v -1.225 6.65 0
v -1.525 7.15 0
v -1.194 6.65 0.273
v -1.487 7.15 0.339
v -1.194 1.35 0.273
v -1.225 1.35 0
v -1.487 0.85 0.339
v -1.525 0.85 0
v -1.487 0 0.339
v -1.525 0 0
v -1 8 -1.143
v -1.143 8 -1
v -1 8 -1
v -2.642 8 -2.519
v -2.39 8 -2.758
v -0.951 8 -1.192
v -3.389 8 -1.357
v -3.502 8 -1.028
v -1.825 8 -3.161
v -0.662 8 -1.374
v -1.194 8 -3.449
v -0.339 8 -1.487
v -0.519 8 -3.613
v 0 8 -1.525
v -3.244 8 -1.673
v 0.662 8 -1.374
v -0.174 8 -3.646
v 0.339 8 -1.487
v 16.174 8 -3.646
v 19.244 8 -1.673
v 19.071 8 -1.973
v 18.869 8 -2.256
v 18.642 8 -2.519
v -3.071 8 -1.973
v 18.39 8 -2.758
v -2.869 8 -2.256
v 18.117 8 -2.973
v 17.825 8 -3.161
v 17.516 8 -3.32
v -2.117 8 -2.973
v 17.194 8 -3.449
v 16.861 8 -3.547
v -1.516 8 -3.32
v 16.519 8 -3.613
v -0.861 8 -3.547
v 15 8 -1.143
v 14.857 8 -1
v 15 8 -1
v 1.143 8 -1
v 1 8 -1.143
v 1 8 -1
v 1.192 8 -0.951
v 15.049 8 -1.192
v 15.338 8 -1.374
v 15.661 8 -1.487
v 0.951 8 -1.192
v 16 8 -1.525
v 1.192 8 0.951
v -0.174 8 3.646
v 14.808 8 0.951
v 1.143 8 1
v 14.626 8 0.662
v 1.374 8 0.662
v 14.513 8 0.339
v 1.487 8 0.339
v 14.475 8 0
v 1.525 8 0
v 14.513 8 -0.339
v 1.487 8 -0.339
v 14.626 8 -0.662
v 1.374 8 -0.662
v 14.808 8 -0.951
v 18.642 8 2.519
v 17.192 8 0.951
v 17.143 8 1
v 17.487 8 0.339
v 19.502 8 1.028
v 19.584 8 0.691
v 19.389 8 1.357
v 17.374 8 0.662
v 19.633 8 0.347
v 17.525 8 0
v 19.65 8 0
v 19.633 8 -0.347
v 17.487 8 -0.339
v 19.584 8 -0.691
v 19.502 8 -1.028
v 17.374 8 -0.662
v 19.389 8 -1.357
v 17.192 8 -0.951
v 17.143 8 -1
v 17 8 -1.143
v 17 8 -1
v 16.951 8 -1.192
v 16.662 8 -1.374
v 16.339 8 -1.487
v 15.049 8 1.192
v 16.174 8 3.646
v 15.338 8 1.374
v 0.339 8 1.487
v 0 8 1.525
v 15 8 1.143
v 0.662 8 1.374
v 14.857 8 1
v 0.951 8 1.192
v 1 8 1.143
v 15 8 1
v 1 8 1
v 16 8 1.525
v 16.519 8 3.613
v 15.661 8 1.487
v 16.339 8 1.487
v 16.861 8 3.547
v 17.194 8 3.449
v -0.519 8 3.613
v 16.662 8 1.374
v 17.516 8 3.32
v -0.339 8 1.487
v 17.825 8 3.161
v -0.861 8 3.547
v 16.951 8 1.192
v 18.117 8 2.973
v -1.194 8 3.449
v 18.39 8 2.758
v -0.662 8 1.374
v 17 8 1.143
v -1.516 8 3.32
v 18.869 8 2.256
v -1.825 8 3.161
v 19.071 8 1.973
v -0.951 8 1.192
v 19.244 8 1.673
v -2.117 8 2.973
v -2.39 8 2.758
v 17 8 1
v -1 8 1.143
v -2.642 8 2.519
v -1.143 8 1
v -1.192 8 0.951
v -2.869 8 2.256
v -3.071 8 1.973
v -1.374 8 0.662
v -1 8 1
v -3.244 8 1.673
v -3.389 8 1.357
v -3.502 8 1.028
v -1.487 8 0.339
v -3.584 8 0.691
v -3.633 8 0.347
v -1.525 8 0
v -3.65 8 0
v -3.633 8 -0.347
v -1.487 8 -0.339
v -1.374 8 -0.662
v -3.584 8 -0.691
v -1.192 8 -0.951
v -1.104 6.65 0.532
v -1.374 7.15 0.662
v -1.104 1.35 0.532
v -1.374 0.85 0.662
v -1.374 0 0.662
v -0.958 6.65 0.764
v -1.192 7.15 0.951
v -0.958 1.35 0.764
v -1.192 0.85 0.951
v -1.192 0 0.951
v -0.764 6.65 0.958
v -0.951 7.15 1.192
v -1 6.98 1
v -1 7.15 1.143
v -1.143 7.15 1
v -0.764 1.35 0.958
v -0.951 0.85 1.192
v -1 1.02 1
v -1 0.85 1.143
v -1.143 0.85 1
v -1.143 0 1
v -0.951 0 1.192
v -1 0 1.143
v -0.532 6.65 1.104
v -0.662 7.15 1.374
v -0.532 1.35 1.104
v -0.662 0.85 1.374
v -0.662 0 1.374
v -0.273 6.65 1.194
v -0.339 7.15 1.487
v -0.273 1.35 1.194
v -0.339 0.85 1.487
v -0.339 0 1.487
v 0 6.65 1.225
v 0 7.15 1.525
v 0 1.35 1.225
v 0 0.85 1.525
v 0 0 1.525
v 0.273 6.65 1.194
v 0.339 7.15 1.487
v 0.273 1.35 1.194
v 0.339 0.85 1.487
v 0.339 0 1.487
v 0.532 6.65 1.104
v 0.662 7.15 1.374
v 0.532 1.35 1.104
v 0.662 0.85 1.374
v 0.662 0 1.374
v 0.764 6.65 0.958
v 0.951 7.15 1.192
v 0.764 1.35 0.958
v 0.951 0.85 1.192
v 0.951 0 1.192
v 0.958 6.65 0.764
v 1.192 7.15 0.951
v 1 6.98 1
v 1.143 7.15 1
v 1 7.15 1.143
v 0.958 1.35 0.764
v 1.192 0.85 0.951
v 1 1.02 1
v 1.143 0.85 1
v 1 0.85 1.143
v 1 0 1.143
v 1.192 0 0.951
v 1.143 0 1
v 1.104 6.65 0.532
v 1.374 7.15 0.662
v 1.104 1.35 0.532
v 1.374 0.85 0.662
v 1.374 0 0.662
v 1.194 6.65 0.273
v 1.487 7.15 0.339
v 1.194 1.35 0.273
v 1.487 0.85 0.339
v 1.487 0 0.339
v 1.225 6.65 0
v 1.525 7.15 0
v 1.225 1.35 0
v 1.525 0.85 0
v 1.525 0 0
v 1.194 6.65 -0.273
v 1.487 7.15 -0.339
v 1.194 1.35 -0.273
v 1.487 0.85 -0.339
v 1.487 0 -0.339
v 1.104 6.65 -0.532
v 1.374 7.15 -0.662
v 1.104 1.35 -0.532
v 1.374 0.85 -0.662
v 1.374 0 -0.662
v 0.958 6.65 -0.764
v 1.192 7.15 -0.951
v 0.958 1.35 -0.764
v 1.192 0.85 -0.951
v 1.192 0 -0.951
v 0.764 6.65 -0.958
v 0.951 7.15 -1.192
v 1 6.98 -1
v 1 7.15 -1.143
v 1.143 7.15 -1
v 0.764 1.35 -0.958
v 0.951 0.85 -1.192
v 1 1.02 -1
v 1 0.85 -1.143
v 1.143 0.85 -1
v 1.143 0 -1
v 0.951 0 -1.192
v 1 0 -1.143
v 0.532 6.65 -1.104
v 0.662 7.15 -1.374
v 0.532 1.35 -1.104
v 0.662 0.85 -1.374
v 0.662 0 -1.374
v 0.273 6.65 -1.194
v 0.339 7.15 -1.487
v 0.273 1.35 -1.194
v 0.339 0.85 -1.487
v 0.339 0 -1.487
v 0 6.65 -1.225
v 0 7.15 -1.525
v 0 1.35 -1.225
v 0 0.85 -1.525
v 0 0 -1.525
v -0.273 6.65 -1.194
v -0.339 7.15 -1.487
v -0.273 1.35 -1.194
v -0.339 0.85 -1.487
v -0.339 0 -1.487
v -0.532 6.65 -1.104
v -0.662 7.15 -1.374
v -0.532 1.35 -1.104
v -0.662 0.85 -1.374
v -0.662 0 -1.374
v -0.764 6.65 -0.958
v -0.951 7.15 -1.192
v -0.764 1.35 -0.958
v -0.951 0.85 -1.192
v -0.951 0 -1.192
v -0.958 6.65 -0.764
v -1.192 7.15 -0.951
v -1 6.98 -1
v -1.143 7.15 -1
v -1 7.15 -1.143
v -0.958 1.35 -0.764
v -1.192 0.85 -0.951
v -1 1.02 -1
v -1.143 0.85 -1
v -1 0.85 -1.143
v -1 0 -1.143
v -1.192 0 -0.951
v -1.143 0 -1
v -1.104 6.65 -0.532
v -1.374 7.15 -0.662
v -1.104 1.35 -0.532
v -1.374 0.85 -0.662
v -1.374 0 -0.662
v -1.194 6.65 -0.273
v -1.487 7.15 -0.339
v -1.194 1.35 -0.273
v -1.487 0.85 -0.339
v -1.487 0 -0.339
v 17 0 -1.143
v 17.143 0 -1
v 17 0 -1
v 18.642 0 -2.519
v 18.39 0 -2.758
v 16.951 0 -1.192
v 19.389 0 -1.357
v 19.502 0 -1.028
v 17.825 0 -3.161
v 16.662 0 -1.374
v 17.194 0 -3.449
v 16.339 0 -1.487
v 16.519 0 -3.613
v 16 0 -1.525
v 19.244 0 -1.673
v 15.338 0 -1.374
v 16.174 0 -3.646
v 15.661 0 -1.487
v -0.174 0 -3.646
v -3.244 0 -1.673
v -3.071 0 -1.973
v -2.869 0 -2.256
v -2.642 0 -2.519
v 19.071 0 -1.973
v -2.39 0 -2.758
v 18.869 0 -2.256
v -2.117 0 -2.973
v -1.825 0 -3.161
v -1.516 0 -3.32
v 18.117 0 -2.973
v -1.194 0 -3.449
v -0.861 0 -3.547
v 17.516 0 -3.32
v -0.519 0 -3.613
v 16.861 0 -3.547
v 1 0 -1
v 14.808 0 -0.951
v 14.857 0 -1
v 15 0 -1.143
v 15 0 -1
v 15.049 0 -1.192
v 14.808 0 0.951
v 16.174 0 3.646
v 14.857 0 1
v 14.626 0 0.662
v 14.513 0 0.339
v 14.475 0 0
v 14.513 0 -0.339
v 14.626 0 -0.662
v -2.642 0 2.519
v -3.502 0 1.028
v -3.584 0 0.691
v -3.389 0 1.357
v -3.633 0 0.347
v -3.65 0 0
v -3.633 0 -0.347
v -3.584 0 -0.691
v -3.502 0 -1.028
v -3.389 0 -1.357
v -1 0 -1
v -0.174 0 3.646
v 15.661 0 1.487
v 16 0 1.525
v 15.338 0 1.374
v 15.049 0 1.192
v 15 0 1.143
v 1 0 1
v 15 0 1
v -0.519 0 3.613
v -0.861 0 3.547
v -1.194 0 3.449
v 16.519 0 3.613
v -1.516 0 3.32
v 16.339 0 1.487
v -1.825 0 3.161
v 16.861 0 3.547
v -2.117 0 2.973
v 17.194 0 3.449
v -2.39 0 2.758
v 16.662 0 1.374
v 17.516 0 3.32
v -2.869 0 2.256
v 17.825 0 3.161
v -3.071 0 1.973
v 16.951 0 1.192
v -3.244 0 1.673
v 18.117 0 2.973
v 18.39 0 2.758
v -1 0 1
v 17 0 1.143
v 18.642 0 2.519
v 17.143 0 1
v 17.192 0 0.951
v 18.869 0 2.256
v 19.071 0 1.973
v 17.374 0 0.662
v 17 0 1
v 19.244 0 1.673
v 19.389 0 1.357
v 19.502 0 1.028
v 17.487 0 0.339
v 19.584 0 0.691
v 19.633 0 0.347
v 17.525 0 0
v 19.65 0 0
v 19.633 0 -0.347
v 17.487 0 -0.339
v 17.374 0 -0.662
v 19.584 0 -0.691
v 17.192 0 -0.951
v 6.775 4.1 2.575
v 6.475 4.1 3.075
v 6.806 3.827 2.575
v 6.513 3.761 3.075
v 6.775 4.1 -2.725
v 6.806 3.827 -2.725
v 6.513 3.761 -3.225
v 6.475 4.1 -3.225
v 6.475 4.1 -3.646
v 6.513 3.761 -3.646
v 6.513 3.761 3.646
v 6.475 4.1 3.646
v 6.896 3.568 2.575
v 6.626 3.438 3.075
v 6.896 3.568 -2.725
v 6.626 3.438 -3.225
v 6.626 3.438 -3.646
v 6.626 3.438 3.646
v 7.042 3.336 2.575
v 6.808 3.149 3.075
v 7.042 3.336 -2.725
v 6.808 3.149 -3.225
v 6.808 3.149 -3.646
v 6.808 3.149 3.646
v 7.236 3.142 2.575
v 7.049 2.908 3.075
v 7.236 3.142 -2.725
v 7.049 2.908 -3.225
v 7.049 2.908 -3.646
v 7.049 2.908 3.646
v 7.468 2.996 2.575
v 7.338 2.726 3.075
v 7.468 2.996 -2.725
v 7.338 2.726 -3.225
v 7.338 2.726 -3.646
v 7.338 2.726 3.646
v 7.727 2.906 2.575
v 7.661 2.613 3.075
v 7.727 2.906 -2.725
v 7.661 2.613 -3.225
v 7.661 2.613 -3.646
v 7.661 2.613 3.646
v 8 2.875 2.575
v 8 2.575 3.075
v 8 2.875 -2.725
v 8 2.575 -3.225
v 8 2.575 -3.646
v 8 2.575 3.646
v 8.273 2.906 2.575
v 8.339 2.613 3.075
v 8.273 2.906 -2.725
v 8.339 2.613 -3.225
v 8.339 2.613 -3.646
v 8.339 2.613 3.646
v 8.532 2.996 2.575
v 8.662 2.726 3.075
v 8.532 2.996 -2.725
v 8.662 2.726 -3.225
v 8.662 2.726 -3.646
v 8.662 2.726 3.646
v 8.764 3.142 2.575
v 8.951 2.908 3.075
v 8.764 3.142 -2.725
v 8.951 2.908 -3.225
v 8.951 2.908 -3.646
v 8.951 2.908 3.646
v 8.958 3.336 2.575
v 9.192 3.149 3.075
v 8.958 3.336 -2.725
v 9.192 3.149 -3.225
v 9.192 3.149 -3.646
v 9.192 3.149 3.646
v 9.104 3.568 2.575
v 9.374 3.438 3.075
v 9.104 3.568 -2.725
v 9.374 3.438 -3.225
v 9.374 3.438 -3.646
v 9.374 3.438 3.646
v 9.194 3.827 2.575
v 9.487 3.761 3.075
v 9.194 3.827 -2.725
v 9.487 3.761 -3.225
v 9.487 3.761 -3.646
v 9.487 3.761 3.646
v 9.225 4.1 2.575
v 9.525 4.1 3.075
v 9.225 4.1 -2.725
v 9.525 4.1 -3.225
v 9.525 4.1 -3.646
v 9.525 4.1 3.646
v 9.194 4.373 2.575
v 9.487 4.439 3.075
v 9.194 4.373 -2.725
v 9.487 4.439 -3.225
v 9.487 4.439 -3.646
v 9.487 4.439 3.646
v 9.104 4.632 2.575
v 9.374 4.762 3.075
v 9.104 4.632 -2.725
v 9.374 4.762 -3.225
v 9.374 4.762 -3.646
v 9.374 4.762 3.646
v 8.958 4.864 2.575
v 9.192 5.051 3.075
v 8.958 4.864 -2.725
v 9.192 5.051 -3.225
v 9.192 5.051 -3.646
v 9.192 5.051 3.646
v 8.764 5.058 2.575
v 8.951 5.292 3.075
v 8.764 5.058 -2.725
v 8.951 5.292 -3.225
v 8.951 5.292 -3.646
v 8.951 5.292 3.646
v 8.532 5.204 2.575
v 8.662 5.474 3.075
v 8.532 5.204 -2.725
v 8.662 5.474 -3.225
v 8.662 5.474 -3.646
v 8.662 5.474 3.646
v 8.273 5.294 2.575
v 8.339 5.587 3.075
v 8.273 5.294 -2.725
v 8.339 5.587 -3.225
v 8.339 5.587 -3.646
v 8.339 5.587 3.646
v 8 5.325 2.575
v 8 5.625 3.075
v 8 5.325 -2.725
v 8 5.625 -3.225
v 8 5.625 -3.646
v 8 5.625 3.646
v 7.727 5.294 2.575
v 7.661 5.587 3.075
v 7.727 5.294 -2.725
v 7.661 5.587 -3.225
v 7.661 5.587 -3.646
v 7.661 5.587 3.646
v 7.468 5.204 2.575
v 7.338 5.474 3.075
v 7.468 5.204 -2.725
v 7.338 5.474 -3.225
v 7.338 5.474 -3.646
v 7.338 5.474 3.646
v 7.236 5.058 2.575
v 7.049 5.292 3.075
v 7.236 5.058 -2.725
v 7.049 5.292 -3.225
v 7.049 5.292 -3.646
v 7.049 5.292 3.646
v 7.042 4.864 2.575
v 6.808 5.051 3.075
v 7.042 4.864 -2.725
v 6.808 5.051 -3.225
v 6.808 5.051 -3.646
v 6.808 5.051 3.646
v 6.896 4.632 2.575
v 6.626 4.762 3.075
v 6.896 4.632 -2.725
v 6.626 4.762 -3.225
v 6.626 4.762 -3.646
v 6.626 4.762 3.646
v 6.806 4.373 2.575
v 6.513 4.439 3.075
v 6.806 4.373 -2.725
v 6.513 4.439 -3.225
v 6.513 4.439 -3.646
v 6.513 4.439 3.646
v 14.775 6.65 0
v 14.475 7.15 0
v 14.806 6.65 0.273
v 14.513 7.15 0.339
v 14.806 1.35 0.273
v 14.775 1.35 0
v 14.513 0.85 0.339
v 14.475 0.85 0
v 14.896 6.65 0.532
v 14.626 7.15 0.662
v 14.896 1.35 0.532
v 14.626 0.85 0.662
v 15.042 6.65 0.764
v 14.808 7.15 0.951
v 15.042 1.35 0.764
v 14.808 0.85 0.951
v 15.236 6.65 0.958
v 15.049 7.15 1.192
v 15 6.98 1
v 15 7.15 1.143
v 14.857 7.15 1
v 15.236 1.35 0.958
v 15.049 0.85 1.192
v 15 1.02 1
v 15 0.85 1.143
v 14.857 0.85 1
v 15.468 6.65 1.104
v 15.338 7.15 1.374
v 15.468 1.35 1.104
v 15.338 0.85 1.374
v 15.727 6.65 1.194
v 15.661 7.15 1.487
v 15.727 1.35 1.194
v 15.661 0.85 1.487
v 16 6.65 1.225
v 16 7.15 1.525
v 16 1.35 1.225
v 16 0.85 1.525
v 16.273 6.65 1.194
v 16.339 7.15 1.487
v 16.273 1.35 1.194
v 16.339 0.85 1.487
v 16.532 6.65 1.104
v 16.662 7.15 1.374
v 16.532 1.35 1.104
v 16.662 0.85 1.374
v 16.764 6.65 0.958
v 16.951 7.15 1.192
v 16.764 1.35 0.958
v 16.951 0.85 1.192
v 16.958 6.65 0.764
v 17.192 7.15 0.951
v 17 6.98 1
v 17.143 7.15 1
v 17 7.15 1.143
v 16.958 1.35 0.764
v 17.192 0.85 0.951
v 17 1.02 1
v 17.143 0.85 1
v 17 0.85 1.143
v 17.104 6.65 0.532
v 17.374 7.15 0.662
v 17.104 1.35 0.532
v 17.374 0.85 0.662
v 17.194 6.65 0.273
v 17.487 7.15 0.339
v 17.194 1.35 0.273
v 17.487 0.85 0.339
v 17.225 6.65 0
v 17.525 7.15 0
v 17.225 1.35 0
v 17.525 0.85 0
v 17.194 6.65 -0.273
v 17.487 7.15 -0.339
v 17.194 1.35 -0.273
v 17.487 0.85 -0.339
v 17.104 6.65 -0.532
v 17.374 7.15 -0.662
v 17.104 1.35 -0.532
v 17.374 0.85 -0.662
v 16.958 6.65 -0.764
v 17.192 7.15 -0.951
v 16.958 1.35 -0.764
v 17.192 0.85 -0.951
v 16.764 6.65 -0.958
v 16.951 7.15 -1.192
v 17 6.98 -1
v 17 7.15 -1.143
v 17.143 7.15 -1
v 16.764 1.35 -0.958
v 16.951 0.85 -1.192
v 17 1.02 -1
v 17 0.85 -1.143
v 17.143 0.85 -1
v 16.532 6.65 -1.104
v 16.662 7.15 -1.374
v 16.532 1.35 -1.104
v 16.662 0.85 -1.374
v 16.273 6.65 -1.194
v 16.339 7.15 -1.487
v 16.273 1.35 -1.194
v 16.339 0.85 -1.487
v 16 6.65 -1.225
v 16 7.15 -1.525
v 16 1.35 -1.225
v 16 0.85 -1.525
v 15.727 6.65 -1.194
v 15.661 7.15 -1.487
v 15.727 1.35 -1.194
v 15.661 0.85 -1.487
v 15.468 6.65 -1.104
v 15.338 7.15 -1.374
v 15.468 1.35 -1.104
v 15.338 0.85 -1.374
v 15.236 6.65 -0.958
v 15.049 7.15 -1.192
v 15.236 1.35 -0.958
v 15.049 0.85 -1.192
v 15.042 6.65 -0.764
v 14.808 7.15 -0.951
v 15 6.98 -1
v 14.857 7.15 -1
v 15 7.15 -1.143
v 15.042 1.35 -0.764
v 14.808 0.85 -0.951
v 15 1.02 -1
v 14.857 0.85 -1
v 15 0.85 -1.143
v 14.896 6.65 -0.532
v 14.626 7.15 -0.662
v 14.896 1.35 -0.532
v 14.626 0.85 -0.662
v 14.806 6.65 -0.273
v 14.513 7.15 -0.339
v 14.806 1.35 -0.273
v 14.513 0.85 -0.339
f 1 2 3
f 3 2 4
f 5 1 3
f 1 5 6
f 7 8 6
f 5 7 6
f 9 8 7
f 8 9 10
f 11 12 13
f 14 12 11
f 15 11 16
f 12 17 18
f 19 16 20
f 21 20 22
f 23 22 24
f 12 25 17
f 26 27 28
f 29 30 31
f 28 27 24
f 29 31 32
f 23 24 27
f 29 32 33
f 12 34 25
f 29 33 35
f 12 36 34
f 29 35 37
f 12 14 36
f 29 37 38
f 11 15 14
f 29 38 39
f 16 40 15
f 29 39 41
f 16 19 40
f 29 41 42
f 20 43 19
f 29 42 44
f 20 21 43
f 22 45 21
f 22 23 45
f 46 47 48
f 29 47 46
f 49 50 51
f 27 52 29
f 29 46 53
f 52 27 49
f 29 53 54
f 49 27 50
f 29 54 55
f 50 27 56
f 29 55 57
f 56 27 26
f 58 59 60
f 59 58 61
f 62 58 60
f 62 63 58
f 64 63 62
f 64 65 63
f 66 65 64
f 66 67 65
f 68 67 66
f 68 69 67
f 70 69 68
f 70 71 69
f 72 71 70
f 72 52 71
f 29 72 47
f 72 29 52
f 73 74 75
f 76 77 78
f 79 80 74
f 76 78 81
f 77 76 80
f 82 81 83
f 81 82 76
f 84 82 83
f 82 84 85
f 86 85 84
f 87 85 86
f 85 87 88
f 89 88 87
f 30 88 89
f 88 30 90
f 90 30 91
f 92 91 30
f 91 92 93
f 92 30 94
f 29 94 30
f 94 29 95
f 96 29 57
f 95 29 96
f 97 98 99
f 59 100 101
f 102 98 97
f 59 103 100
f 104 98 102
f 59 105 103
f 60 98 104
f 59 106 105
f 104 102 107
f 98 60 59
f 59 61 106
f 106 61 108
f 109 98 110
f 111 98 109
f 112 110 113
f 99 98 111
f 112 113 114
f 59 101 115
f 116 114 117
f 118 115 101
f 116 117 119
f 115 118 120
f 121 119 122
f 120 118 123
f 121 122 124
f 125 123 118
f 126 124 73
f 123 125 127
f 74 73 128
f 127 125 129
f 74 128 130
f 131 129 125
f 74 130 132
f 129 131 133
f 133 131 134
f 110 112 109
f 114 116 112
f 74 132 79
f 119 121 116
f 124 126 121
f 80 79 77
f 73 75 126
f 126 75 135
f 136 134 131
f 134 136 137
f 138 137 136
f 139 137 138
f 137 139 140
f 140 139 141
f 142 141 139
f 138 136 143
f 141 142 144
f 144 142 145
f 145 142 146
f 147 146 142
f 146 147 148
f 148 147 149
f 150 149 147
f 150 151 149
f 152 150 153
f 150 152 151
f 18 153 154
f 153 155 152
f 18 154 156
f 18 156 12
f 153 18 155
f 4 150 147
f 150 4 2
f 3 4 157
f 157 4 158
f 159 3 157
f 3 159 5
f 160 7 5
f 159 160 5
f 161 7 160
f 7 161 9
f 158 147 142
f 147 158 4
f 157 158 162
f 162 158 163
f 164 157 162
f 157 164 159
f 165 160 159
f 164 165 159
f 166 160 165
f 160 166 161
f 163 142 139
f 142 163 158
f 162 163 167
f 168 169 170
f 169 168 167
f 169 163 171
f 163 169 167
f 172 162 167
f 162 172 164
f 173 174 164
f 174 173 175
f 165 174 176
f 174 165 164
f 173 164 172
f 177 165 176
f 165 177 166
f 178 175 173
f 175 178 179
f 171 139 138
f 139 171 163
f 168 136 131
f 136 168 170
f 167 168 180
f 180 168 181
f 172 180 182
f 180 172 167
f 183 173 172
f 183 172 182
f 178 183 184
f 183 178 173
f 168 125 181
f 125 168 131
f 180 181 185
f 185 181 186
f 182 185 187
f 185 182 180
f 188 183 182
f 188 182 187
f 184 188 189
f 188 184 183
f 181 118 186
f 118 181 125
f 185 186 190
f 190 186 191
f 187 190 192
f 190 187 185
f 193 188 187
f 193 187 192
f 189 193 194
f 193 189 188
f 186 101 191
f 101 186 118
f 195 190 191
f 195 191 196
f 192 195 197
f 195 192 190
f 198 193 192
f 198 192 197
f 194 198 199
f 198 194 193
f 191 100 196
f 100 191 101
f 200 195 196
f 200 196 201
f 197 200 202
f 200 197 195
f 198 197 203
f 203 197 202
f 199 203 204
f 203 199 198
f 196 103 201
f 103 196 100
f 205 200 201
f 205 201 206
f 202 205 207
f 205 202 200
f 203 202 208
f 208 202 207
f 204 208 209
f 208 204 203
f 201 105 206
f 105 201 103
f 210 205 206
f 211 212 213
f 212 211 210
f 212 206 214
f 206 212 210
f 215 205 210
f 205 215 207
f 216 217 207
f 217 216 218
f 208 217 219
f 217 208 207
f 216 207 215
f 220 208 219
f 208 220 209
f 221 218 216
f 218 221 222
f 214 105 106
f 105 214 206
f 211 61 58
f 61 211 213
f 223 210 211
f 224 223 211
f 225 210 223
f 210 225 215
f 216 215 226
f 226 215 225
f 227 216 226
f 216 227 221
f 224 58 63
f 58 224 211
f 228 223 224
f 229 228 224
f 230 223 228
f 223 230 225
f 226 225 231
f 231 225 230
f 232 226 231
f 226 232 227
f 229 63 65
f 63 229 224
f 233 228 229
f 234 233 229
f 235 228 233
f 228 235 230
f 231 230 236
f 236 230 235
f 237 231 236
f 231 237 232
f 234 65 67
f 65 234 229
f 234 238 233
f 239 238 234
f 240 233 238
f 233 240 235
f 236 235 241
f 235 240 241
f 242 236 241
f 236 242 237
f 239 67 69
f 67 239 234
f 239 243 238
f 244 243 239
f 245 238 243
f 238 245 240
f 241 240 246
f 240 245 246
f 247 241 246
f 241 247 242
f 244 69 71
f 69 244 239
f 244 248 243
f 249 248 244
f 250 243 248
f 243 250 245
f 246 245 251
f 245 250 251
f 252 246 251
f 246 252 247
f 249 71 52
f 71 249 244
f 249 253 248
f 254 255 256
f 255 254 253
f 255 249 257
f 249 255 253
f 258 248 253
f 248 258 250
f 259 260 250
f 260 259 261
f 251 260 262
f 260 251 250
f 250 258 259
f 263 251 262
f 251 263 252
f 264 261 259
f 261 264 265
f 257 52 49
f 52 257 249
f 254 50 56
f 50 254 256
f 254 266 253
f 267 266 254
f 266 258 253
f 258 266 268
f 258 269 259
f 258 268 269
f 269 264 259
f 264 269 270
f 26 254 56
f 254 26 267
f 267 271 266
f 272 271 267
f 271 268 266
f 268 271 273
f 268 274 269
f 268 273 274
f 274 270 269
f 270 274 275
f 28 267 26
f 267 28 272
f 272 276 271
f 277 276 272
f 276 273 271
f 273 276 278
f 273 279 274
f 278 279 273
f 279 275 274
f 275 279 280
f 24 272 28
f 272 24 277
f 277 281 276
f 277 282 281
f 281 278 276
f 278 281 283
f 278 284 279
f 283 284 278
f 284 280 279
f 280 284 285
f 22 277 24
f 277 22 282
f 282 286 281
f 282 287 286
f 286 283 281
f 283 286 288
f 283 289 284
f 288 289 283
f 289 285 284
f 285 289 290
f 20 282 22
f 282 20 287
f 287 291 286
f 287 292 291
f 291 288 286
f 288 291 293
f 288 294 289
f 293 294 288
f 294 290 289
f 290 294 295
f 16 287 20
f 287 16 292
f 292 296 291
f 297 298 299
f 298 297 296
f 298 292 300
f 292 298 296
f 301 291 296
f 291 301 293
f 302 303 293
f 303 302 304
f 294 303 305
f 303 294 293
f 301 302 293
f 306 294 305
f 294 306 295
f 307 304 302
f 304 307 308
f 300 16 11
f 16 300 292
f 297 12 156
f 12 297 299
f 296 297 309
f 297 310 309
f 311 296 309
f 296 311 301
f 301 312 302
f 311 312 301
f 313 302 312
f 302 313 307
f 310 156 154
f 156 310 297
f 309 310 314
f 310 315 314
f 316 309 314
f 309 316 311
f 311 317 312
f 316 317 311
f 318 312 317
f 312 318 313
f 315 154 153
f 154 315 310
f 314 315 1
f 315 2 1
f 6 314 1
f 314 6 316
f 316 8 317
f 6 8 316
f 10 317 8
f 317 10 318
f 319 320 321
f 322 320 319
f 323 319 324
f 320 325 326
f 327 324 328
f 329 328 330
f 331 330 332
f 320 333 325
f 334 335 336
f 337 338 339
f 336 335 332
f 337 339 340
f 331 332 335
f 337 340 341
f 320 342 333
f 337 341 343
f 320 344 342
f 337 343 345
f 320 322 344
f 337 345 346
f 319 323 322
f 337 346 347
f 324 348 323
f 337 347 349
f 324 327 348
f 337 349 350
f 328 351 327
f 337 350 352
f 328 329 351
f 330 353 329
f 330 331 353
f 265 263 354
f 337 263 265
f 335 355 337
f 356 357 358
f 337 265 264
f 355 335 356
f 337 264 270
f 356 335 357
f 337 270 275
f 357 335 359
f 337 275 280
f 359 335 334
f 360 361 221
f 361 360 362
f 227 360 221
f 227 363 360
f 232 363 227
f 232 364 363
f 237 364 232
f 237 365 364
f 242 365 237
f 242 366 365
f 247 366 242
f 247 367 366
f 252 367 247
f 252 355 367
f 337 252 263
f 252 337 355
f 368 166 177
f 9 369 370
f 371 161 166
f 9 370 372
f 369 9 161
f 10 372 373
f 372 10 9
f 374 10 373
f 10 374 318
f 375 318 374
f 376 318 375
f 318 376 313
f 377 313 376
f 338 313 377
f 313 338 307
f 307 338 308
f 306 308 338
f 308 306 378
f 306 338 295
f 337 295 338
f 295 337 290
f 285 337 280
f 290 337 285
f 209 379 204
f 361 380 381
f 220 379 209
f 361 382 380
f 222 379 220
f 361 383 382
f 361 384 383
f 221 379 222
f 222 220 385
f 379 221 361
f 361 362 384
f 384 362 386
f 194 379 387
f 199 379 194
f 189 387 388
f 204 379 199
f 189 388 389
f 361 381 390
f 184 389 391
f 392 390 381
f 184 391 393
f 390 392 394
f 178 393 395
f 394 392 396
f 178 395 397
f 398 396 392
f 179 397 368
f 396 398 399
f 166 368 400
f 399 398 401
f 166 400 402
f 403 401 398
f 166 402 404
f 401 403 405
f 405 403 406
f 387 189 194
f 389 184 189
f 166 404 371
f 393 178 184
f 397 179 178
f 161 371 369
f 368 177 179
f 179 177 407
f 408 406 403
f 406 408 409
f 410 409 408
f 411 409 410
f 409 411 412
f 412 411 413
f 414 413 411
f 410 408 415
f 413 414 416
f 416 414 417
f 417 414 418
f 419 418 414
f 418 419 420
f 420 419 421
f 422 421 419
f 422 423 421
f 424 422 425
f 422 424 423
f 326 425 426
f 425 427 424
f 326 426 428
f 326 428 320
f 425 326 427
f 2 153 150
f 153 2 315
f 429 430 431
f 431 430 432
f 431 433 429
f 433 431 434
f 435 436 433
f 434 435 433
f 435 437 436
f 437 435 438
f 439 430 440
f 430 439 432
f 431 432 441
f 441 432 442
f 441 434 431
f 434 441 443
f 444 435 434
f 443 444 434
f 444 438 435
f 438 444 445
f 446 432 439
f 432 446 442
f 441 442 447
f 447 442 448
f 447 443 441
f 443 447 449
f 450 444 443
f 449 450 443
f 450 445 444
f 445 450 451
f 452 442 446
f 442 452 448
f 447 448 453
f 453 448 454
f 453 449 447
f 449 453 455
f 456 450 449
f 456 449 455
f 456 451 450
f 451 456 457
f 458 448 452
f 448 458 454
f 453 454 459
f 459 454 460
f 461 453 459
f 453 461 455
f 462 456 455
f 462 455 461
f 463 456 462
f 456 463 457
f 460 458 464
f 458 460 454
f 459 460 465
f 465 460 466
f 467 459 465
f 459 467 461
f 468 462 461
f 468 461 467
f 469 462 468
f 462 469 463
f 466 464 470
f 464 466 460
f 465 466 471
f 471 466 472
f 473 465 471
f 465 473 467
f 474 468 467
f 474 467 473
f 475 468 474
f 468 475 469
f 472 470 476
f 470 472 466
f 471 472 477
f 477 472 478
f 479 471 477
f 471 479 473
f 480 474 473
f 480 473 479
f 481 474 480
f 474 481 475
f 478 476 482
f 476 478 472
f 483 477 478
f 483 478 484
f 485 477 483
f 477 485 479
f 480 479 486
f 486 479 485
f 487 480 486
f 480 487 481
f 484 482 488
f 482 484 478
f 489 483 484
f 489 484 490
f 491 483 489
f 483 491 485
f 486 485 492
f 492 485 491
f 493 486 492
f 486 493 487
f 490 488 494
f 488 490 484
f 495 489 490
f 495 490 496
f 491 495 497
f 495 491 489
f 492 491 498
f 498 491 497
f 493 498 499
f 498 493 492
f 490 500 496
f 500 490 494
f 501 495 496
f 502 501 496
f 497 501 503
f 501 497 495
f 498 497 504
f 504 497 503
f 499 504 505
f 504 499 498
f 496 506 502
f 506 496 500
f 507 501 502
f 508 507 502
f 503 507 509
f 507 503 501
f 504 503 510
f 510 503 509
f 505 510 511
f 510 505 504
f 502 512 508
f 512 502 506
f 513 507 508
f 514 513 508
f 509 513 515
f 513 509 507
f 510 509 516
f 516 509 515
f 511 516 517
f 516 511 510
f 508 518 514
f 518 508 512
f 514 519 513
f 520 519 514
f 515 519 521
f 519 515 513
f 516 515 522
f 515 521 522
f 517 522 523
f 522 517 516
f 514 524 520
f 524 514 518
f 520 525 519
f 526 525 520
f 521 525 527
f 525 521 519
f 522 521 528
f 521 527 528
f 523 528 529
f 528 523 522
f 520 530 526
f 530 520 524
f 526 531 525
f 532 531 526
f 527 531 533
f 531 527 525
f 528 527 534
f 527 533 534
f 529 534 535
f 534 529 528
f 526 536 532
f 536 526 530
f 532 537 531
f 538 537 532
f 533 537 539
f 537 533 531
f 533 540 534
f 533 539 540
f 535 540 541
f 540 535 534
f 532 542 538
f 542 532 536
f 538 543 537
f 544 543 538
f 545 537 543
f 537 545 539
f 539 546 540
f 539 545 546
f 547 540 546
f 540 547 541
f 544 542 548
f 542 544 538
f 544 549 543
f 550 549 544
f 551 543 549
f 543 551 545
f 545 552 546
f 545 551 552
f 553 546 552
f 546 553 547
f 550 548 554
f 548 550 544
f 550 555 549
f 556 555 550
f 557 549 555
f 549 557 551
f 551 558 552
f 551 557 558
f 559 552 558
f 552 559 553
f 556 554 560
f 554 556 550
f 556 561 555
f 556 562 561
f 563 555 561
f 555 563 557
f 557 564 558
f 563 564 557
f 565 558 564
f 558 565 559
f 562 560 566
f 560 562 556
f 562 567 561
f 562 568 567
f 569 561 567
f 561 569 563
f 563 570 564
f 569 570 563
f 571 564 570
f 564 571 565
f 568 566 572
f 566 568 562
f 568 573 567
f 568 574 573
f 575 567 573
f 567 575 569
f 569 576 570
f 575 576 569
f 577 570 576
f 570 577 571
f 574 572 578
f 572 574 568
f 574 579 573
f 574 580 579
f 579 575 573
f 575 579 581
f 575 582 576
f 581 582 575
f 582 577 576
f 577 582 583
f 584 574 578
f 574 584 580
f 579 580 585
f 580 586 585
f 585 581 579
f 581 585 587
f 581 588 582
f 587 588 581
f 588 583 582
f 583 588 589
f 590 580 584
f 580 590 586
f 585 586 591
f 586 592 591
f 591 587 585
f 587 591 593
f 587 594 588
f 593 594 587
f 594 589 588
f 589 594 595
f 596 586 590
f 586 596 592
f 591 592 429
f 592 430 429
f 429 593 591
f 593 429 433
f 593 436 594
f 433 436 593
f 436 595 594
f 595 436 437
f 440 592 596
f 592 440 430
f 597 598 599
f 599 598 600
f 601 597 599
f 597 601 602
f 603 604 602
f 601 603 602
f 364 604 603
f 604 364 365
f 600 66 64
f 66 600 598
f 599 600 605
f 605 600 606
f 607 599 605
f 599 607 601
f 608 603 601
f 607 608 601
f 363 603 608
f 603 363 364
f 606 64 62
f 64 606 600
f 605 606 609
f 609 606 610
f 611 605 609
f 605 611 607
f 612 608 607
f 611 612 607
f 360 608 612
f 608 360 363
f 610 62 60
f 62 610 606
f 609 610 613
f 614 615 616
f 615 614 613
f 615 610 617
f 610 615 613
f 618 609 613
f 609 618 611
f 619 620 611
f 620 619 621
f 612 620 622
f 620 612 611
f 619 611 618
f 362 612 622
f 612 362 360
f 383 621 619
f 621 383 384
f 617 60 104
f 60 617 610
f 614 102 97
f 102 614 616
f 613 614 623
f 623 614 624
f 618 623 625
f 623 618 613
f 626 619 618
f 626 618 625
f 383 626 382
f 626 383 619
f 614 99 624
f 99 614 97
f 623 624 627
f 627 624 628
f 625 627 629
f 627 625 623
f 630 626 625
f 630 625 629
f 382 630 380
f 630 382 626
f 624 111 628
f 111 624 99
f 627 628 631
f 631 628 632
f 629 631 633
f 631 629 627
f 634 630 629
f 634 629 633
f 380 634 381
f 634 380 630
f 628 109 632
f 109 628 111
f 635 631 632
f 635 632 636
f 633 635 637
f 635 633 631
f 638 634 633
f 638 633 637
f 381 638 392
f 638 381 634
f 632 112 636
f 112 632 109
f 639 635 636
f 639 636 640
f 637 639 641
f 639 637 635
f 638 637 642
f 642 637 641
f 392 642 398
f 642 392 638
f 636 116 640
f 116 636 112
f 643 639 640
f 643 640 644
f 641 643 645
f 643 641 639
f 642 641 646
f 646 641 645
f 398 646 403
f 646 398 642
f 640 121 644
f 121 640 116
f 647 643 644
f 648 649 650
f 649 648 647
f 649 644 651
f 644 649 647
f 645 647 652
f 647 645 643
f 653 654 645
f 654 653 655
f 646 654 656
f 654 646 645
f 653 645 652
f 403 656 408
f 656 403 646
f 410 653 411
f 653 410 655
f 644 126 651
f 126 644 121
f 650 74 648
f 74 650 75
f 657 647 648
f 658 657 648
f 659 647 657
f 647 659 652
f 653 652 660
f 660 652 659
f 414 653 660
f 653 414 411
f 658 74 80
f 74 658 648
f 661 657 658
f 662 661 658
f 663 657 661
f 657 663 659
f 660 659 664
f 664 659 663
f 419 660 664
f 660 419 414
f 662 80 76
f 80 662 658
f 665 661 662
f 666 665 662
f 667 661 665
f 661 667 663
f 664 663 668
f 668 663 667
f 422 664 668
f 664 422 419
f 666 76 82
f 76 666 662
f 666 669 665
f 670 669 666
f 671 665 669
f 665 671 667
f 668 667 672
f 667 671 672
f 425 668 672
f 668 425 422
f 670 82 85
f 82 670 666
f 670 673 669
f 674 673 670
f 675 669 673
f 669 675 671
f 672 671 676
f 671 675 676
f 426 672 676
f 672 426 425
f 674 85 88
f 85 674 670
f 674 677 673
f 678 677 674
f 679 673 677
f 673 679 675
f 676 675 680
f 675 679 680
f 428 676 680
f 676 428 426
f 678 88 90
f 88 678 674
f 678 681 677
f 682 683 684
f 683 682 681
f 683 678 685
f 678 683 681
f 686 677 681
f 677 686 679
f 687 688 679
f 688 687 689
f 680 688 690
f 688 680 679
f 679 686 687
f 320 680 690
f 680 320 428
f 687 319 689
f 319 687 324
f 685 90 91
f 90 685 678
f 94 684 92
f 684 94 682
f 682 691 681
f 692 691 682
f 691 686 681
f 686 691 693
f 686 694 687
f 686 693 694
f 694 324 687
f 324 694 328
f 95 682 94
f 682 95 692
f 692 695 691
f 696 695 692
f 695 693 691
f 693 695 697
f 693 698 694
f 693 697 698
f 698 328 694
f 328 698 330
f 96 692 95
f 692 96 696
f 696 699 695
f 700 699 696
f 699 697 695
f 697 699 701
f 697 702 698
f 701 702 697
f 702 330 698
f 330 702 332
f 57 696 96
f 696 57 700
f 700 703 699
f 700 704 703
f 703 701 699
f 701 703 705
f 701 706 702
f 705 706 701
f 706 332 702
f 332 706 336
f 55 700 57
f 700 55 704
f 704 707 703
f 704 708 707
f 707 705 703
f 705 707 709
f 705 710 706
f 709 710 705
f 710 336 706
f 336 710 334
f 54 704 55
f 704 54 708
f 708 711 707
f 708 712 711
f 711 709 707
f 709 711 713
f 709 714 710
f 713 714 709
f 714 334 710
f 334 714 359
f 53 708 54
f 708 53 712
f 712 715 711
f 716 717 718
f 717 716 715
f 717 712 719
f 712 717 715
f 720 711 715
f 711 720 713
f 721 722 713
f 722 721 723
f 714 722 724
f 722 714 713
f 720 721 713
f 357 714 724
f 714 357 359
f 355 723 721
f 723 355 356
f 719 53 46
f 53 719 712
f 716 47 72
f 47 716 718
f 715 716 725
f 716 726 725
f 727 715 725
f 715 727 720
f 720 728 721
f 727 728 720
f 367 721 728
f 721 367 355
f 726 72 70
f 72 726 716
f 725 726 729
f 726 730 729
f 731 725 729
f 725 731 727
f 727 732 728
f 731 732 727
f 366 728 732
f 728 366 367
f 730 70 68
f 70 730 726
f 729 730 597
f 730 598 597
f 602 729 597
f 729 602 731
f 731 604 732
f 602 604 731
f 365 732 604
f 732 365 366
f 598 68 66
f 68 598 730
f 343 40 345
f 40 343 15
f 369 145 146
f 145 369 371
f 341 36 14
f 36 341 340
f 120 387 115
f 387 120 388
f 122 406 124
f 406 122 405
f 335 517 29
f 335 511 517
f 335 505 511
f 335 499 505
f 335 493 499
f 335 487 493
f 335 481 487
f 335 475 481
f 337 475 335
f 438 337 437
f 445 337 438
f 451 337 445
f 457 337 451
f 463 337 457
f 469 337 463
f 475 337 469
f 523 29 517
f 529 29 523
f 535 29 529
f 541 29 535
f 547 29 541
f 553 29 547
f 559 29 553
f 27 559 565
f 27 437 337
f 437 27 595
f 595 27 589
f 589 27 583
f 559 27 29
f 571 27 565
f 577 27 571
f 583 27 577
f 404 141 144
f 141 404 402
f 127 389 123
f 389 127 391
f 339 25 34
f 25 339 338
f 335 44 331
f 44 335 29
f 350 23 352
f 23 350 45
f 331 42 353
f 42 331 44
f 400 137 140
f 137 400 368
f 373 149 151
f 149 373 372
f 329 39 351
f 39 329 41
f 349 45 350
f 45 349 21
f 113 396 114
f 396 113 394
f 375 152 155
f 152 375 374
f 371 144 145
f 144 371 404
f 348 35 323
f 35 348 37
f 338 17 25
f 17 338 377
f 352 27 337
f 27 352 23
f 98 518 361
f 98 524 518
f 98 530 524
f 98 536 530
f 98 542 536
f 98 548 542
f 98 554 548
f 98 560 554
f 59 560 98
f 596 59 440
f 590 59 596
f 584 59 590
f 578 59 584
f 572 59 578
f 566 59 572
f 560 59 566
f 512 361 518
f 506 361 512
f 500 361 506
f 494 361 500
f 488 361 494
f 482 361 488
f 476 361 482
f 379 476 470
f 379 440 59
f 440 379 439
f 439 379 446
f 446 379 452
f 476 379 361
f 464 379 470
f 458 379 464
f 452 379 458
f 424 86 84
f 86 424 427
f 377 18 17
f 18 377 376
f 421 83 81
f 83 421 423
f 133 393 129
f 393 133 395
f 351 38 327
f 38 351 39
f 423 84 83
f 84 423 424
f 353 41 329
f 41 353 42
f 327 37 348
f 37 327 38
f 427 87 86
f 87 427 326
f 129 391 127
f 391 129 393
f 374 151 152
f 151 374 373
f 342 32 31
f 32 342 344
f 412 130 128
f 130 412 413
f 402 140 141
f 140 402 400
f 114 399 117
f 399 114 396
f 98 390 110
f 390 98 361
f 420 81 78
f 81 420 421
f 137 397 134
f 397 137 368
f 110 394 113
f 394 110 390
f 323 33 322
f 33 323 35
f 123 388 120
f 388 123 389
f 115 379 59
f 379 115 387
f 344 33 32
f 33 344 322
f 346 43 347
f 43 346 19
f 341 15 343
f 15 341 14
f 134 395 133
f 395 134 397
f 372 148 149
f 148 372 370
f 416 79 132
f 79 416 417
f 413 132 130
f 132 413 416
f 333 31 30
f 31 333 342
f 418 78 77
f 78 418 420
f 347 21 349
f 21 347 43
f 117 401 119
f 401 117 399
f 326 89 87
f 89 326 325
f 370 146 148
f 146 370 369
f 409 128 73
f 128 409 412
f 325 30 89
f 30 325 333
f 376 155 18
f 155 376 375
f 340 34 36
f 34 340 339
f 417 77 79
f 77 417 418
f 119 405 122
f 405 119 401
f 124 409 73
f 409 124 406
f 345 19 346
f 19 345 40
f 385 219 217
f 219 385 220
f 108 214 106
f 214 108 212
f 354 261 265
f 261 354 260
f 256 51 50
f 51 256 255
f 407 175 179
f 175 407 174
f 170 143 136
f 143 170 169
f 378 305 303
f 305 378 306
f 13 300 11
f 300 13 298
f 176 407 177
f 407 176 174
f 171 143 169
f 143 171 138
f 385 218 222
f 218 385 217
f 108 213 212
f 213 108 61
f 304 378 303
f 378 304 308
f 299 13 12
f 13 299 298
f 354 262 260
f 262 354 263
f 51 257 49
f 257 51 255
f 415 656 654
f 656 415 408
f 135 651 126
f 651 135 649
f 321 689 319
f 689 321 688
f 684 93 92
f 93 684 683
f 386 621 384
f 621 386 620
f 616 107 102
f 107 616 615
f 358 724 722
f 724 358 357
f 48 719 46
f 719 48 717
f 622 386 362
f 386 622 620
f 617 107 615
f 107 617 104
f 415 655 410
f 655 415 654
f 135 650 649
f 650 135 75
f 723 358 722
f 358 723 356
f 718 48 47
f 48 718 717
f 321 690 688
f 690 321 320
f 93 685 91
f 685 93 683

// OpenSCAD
// file: customizable_straight_beam_v4o.scad
/*      
        Even More Customizable Straight LEGO Technic Beam
        Based on Customizable Straight LEGO Technic Beam
         and Parametric LEGO Technic Beam by "projunk" and "stevemedwin"
        
        www.thingiverse.com/thing:203935
        
        Also uploaded to Prusaprinters.org at https://www.prusaprinters.org/prints/33038-even-more-customizable-straight-beam-for-legotm-te
        
        Modified by Sam Kass
        November 2015

		Modified by Orso Eric (2024-03)	
		https://github.com/OrsoEric/OpenSCAD-lego-library
*/

// user parameters

//Hole sequence
//o for round hole
//+ for plus-shaped hole
//capital O for sideways hole
//capital P for sideways plus
//and x for blank spot.
//eg. lego_beam("+xPOo");

cn_lego_pitch_stud = 8.0;
cn_lego_drill_small = 4.9/2;
cn_lego_drill_large = 6.1/2;
cn_lego_height_beam = 7.8;

cn_lego_width_beam = 7.3; 
cn_lego_drill_axel = 2.0;

//How deep the shriking of the big hole
cn_lego_drill_depth_indent = 0.85;
//How steep the transition from big hole to small hole
cn_lego_drill_sharpness = 0.5;

module body( in_length_stud, in_height = cn_lego_height_beam, in_precision = 0.5 )
{
    translate([0, cn_lego_width_beam/2, 0]) 
    hull()
	{
        cylinder(r=cn_lego_width_beam/2, h=in_height,$fa = 0.1+in_precision, $fs = 0.1+in_precision/2);    
        translate([(in_length_stud-1)*cn_lego_pitch_stud, 0, 0]) 
            cylinder(r=cn_lego_width_beam/2, h=in_height,$fa = 0.1+in_precision, $fs = 0.1+in_precision/2);
    }
}

module hole( in_height = cn_lego_height_beam, in_precision = 0.5 )
{
	an_cross_section = [
		//Bottom
		[0,0],
		//Top
		[0,in_height],
		//Top Big hole
		[cn_lego_drill_large/2,in_height],
		[cn_lego_drill_large/2,in_height-cn_lego_drill_depth_indent],
		//Top Small Hole
		[cn_lego_drill_small/2,in_height-cn_lego_drill_depth_indent-cn_lego_drill_sharpness],
		//Bottom Small hole
		[cn_lego_drill_small/2,cn_lego_drill_depth_indent+cn_lego_drill_sharpness],
		//Bottom Big Hole
		[cn_lego_drill_large/2,cn_lego_drill_depth_indent],
		[cn_lego_drill_large/2,0]
	];
	//Rotate the cross section of the hole around its axis, to generate the hole
	rotate_extrude($fa = 0.1+in_precision, $fs = 0.1+in_precision/2)
	polygon(an_cross_section);
}

module plus( in_height = cn_lego_height_beam )
{
    union()
	{
        translate([-cn_lego_drill_axel/2, -cn_lego_drill_small, 0]) 
            cube([cn_lego_drill_axel, cn_lego_drill_small*2, in_height]);

        translate([-cn_lego_drill_small, -cn_lego_drill_axel/2, 0]) 
            cube([cn_lego_drill_small*2, cn_lego_drill_axel, in_height]);
    }
}

module lego_beam( is_holes, in_height = cn_lego_height_beam  )
{
	//number of studs
	in_length = len(is_holes);

	if (in_length > 0)
	{
		//Center the beam
		translate([0,cn_lego_pitch_stud,0])
		rotate([90,0,0])
		difference()
		{
			body( in_length, in_height );
			for (i = [1:in_length])
			{
				if (is_holes[i-1] == "+")
					translate([(i-1)*cn_lego_pitch_stud, cn_lego_width_beam/2, 0])
						plus( in_height );
				else if (is_holes[i-1] == "o")
					translate([(i-1)*cn_lego_pitch_stud, cn_lego_width_beam/2, 0])
						hole( in_height );
				else if (is_holes[i-1] == "O")
					rotate([90,0,0])
					translate([(i-1)*cn_lego_pitch_stud, cn_lego_height_beam/2,-cn_lego_pitch_stud+cn_lego_drill_depth_indent/2])
						hole( in_height );
				else if (is_holes[i-1] == "P")
					rotate([90,0,0])
					translate([(i-1)*cn_lego_pitch_stud, cn_lego_height_beam/2,-cn_lego_pitch_stud+cn_lego_drill_depth_indent/2])
						plus( in_height );
				else 
				{
					//no drill, leave a blank space
				}
			}
		}
	}
}

//Get an array of string, each will become a beam
//E.g. lego_plate(["o+Po", "oPOo", "oP+o"]);
// o+Po
// oPOo
// oP+o
module lego_plate( ias_pattern )
{
	//number of beams side to side
	in_width_stud = len(ias_pattern);

    for (cnt = [0:in_width_stud-1])
    {
        translate([0,cn_lego_pitch_stud*cnt,-0.5*cn_lego_width_beam])
            lego_beam(ias_pattern[cnt], cn_lego_pitch_stud);
    }
}

//Same as lego_plate, but slices along width, not length
//It's easier to make patterns on plates this way
//E.g. lego_plate(["ooo", "+PP", "PO+","ooo"]);
module lego_plate_alternate(ias_pattern)
{
    // number of beams side to side
    in_width_stud = len(ias_pattern[0]); // assuming all strings are of the same length
	in_length_stud = len(ias_pattern);
	echo("Length: ",in_length_stud, "cn_lego_width_beam: ", in_width_stud);
    for (cnt = [0:in_width_stud-1])
    {
        ac_array = [for(i = [0:in_length_stud-1]) ias_pattern[i][cnt]];
		echo( "Beam:", cnt, "Pattern:", ac_array );
        translate([0,cn_lego_pitch_stud*cnt,-0.5*cn_lego_width_beam])
            lego_beam(ac_array, cn_lego_pitch_stud);
    }
}
lego_plate_alternate
([
	"o",
	"O",
	"o",
]);

//lego_plate_alternate(["ooo", "+++", "POP", "ooo"]);
// main file
//
include <customizable_straight_beam_v4o.scad>


lego_plate_alternate
([
	"+",
	"O",
	"+",
]);

if (false)
{
	//Long boi
	lego_plate_alternate
	([
	 "ooooooooooooooooooooooooooo"
	]);
}


if(false)
{
	//5x13
	lego_plate_alternate
	([
		"ooooo",
		"OPOPO",
		"+OPO+",
		"OPOPO",
		"+OPO+",
		"OPOPO",
		"+OPO+",
		"OPOPO",
		"+OPO+",
		"OPOPO",
		"+OPO+",
		"OPOPO",
		"ooooo",
	]);
}
